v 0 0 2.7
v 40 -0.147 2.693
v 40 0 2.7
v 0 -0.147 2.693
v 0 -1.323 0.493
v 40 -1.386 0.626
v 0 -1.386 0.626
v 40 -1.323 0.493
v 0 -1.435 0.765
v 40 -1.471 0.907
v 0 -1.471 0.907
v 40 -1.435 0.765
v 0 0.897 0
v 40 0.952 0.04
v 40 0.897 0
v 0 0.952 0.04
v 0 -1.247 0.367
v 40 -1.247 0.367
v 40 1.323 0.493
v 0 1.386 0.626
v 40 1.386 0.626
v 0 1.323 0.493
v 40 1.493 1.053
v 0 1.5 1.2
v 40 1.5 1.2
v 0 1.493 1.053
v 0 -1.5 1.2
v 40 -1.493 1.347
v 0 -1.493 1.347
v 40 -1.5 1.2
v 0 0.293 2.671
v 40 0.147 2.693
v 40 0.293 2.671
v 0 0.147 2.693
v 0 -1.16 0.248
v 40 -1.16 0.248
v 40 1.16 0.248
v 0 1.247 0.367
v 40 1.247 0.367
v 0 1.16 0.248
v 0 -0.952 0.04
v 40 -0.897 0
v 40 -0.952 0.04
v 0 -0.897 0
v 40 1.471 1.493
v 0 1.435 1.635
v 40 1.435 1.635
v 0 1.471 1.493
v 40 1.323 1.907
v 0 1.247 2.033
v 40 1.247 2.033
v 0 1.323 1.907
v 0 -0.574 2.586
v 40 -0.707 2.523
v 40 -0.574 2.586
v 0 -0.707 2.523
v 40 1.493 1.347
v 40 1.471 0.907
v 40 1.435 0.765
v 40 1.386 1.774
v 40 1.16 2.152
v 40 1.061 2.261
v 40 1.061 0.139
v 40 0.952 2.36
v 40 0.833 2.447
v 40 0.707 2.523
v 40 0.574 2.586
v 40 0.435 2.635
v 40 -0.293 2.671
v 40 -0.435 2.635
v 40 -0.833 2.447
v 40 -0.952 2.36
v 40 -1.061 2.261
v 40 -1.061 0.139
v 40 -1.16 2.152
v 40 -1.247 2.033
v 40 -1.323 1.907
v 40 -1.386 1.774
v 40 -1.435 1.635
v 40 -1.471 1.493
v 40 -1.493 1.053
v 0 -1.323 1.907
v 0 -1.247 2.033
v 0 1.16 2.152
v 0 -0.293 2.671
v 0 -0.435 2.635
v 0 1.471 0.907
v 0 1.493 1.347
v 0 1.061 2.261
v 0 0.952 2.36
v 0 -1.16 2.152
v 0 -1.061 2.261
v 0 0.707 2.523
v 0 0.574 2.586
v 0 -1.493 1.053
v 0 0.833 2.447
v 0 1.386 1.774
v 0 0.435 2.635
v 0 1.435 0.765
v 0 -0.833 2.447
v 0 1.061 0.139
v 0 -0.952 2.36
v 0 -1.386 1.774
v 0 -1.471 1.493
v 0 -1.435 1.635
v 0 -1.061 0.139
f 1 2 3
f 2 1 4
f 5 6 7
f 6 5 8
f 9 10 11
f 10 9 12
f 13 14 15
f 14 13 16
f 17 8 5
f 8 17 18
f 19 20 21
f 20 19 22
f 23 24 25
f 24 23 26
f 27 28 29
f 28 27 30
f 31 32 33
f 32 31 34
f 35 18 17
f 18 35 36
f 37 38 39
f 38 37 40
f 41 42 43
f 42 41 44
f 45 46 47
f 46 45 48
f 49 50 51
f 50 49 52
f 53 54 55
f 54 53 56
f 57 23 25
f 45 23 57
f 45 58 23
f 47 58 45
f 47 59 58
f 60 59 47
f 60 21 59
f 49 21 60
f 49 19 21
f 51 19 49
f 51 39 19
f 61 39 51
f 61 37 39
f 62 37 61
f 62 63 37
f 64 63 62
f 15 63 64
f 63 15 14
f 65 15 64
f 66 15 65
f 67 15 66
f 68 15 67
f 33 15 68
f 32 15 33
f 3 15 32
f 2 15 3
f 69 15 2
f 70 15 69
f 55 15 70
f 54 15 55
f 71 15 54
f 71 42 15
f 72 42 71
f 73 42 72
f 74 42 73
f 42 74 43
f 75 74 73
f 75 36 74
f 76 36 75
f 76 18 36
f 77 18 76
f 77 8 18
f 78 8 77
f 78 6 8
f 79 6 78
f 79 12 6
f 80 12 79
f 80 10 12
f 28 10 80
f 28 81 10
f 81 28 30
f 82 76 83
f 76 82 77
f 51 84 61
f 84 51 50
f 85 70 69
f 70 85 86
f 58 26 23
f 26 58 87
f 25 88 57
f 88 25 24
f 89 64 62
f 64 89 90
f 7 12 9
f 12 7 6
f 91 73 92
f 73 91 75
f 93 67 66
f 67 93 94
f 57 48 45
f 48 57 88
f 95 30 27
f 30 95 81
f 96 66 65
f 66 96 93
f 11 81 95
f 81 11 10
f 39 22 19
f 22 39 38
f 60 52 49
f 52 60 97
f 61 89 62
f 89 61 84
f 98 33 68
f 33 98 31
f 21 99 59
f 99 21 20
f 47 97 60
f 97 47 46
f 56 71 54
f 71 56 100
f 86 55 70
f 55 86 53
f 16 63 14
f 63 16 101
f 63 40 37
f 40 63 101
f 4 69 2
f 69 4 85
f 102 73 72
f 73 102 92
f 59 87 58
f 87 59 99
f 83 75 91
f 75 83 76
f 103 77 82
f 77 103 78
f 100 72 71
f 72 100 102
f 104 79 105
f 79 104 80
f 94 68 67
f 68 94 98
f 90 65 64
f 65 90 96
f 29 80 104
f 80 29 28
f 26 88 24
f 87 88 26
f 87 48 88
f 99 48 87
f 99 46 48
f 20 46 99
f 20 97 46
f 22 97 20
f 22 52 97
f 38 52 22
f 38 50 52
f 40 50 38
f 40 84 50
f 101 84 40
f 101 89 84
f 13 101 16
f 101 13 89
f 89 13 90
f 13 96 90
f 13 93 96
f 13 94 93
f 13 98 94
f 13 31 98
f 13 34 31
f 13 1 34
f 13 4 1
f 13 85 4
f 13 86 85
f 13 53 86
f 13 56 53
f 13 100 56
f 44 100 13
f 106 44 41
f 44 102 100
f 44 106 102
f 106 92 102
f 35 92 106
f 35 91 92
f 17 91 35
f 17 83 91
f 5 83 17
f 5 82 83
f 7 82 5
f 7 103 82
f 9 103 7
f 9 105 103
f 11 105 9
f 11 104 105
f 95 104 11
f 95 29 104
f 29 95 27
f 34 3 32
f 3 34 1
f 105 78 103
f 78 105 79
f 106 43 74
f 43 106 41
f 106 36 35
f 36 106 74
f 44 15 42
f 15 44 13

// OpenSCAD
// file: ../config.scad
// =====================================================================
//  Brick system: global configuration
//
//  Every grid and fit value from SPEC.md lives here. Values marked
//  [fit] are the ones to re-tune per printer/filament with the
//  calibration coupon (parts.scad -> coupon()). Override any of them
//  from the command line without editing this file:
//
//    openscad -D 'RIB_D=4.8' -o plate.stl examples/plates.scad
//
//  All lengths in mm. Designed for a 0.4 mm nozzle and 0.2 mm layers.
// =====================================================================

$fn = 64;
eps = 0.01;               // overlap for clean booleans (not a real dimension)
FONT = "DejaVu Sans:style=Bold";

// ---------- print process ----------
LINE   = 0.45;            // extrusion width; walls are multiples (see WALL_*)
LAYER  = 0.2;             // layer height; heights are multiples of this
WALL_1 = 0.9;             // 2 lines, the minimum anywhere
WALL_2 = 1.3;             // 3 lines
WALL_3 = 1.8;             // 4 lines
BRIDGE_MAX = 6.0;         // longest flat bridge allowed

// ---------- grid ----------
PITCH = 8.0;              // horizontal grid
PLATE = 3.2;              // plate height
BRICK = 9.6;              // 3 plates
GAP   = 0.1;              // per side; outer size = n*8 - 0.2

// ---------- connector 1: stud + crush-rib socket ----------
STUD_D        = 5.0;
STUD_H        = 1.6;
STUD_CHAMFER  = 0.4;      // lead-in on top of stud
STUD_FILLET   = 0.4;      // root fillet against layer-line breakage
SOCKET_D      = 5.4;      // bore: 0.2 mm clearance per side before ribs
SOCKET_DEPTH  = 1.8;      // leaves a 1.4 mm roof in a 3.2 mm plate
SOCKET_CHAMF  = 0.4;      // entry chamfer (also hides elephant's foot)
RIB_R         = 0.5;      // rib = vertical half-cylinder
RIB_N         = 4;
RIB_D         = 4.75;     // [fit] diameter across rib tips (4.8 / 4.7 tested good)
ROOF          = PLATE - SOCKET_DEPTH;   // 1.4 mm of material above a socket in a plate

// ---------- connector 2: slot + flat clip ----------
CLIP_T      = 2.0;        // thickness (Z when printed flat)
CLIP_W      = 5.0;        // body width
CLIP_HALF   = 3.4;        // engagement depth per side (clip length 6.8)
CLIP_ARM    = 0.9;        // spring arm width (2 lines)
CLIP_BAND   = 0.8;        // solid centre band
BARB        = 0.3;        // barb height above body width, per side
BARB_LEAD   = 0.15;       // chamfer at arm tip
CLIP_ROOT_R = 0.3;        // fillet radius at the arm roots
SLOT_CLEAR  = 0.15;       // [fit] clearance per side in the thickness direction
SLOT_INTERF = 0.10;       // [fit] barb interference per side
SLOT_T      = CLIP_T + 2*SLOT_CLEAR;   // 2.3
SLOT_DEPTH  = CLIP_HALF + 0.2;         // 3.6
SLOT_CHAMF  = 0.4;        // entry chamfer of top-face slots
SIDE_SLOT_MIN_H = 2*PLATE;             // parts lower than 6.4 get no side slots
function slot_len(interf = SLOT_INTERF) = CLIP_W + 2*(BARB - interf);   // 5.4

// ---------- axles ----------
AXLE_D       = 3.0;       // steel rod / M3 screw
BORE_SPIN_D  = 3.2;       // [fit] free-running teardrop bore (3.3 too wobbly)
BORE_GRIP_D  = 2.8;       // [fit] diameter across rib tips of a grip bore
GRIP_BORE_D  = 3.4;       // base bore under the grip ribs
AXLE_FLAT    = 0.3;       // flat on the bed side of a printed axle

// ---------- part design values (not connector fits) ----------
HINGE_CLEAR    = 0.3;     // gap between interleaved hinge knuckles, radial and axial
WHEEL_CHANNEL  = 1.2;     // depth of the tyre channel in a wheel rim
TIRE_STRETCH   = 0.2;     // tyre inner radius is this much smaller than the channel (TPU)

// ---------- helpers ----------
function cell(i) = PITCH*i + PITCH/2;          // centre of grid cell i
function snap_layer(h) = round(h / LAYER) * LAYER;
// main file
// Printed Ø3 axle, lying flat (alternative to a steel rod / M3 screw).
include <../parts.scad>

/* [Axle] */
// Length (mm)
length = 40; // [8:1:200]

printed_axle(length);
